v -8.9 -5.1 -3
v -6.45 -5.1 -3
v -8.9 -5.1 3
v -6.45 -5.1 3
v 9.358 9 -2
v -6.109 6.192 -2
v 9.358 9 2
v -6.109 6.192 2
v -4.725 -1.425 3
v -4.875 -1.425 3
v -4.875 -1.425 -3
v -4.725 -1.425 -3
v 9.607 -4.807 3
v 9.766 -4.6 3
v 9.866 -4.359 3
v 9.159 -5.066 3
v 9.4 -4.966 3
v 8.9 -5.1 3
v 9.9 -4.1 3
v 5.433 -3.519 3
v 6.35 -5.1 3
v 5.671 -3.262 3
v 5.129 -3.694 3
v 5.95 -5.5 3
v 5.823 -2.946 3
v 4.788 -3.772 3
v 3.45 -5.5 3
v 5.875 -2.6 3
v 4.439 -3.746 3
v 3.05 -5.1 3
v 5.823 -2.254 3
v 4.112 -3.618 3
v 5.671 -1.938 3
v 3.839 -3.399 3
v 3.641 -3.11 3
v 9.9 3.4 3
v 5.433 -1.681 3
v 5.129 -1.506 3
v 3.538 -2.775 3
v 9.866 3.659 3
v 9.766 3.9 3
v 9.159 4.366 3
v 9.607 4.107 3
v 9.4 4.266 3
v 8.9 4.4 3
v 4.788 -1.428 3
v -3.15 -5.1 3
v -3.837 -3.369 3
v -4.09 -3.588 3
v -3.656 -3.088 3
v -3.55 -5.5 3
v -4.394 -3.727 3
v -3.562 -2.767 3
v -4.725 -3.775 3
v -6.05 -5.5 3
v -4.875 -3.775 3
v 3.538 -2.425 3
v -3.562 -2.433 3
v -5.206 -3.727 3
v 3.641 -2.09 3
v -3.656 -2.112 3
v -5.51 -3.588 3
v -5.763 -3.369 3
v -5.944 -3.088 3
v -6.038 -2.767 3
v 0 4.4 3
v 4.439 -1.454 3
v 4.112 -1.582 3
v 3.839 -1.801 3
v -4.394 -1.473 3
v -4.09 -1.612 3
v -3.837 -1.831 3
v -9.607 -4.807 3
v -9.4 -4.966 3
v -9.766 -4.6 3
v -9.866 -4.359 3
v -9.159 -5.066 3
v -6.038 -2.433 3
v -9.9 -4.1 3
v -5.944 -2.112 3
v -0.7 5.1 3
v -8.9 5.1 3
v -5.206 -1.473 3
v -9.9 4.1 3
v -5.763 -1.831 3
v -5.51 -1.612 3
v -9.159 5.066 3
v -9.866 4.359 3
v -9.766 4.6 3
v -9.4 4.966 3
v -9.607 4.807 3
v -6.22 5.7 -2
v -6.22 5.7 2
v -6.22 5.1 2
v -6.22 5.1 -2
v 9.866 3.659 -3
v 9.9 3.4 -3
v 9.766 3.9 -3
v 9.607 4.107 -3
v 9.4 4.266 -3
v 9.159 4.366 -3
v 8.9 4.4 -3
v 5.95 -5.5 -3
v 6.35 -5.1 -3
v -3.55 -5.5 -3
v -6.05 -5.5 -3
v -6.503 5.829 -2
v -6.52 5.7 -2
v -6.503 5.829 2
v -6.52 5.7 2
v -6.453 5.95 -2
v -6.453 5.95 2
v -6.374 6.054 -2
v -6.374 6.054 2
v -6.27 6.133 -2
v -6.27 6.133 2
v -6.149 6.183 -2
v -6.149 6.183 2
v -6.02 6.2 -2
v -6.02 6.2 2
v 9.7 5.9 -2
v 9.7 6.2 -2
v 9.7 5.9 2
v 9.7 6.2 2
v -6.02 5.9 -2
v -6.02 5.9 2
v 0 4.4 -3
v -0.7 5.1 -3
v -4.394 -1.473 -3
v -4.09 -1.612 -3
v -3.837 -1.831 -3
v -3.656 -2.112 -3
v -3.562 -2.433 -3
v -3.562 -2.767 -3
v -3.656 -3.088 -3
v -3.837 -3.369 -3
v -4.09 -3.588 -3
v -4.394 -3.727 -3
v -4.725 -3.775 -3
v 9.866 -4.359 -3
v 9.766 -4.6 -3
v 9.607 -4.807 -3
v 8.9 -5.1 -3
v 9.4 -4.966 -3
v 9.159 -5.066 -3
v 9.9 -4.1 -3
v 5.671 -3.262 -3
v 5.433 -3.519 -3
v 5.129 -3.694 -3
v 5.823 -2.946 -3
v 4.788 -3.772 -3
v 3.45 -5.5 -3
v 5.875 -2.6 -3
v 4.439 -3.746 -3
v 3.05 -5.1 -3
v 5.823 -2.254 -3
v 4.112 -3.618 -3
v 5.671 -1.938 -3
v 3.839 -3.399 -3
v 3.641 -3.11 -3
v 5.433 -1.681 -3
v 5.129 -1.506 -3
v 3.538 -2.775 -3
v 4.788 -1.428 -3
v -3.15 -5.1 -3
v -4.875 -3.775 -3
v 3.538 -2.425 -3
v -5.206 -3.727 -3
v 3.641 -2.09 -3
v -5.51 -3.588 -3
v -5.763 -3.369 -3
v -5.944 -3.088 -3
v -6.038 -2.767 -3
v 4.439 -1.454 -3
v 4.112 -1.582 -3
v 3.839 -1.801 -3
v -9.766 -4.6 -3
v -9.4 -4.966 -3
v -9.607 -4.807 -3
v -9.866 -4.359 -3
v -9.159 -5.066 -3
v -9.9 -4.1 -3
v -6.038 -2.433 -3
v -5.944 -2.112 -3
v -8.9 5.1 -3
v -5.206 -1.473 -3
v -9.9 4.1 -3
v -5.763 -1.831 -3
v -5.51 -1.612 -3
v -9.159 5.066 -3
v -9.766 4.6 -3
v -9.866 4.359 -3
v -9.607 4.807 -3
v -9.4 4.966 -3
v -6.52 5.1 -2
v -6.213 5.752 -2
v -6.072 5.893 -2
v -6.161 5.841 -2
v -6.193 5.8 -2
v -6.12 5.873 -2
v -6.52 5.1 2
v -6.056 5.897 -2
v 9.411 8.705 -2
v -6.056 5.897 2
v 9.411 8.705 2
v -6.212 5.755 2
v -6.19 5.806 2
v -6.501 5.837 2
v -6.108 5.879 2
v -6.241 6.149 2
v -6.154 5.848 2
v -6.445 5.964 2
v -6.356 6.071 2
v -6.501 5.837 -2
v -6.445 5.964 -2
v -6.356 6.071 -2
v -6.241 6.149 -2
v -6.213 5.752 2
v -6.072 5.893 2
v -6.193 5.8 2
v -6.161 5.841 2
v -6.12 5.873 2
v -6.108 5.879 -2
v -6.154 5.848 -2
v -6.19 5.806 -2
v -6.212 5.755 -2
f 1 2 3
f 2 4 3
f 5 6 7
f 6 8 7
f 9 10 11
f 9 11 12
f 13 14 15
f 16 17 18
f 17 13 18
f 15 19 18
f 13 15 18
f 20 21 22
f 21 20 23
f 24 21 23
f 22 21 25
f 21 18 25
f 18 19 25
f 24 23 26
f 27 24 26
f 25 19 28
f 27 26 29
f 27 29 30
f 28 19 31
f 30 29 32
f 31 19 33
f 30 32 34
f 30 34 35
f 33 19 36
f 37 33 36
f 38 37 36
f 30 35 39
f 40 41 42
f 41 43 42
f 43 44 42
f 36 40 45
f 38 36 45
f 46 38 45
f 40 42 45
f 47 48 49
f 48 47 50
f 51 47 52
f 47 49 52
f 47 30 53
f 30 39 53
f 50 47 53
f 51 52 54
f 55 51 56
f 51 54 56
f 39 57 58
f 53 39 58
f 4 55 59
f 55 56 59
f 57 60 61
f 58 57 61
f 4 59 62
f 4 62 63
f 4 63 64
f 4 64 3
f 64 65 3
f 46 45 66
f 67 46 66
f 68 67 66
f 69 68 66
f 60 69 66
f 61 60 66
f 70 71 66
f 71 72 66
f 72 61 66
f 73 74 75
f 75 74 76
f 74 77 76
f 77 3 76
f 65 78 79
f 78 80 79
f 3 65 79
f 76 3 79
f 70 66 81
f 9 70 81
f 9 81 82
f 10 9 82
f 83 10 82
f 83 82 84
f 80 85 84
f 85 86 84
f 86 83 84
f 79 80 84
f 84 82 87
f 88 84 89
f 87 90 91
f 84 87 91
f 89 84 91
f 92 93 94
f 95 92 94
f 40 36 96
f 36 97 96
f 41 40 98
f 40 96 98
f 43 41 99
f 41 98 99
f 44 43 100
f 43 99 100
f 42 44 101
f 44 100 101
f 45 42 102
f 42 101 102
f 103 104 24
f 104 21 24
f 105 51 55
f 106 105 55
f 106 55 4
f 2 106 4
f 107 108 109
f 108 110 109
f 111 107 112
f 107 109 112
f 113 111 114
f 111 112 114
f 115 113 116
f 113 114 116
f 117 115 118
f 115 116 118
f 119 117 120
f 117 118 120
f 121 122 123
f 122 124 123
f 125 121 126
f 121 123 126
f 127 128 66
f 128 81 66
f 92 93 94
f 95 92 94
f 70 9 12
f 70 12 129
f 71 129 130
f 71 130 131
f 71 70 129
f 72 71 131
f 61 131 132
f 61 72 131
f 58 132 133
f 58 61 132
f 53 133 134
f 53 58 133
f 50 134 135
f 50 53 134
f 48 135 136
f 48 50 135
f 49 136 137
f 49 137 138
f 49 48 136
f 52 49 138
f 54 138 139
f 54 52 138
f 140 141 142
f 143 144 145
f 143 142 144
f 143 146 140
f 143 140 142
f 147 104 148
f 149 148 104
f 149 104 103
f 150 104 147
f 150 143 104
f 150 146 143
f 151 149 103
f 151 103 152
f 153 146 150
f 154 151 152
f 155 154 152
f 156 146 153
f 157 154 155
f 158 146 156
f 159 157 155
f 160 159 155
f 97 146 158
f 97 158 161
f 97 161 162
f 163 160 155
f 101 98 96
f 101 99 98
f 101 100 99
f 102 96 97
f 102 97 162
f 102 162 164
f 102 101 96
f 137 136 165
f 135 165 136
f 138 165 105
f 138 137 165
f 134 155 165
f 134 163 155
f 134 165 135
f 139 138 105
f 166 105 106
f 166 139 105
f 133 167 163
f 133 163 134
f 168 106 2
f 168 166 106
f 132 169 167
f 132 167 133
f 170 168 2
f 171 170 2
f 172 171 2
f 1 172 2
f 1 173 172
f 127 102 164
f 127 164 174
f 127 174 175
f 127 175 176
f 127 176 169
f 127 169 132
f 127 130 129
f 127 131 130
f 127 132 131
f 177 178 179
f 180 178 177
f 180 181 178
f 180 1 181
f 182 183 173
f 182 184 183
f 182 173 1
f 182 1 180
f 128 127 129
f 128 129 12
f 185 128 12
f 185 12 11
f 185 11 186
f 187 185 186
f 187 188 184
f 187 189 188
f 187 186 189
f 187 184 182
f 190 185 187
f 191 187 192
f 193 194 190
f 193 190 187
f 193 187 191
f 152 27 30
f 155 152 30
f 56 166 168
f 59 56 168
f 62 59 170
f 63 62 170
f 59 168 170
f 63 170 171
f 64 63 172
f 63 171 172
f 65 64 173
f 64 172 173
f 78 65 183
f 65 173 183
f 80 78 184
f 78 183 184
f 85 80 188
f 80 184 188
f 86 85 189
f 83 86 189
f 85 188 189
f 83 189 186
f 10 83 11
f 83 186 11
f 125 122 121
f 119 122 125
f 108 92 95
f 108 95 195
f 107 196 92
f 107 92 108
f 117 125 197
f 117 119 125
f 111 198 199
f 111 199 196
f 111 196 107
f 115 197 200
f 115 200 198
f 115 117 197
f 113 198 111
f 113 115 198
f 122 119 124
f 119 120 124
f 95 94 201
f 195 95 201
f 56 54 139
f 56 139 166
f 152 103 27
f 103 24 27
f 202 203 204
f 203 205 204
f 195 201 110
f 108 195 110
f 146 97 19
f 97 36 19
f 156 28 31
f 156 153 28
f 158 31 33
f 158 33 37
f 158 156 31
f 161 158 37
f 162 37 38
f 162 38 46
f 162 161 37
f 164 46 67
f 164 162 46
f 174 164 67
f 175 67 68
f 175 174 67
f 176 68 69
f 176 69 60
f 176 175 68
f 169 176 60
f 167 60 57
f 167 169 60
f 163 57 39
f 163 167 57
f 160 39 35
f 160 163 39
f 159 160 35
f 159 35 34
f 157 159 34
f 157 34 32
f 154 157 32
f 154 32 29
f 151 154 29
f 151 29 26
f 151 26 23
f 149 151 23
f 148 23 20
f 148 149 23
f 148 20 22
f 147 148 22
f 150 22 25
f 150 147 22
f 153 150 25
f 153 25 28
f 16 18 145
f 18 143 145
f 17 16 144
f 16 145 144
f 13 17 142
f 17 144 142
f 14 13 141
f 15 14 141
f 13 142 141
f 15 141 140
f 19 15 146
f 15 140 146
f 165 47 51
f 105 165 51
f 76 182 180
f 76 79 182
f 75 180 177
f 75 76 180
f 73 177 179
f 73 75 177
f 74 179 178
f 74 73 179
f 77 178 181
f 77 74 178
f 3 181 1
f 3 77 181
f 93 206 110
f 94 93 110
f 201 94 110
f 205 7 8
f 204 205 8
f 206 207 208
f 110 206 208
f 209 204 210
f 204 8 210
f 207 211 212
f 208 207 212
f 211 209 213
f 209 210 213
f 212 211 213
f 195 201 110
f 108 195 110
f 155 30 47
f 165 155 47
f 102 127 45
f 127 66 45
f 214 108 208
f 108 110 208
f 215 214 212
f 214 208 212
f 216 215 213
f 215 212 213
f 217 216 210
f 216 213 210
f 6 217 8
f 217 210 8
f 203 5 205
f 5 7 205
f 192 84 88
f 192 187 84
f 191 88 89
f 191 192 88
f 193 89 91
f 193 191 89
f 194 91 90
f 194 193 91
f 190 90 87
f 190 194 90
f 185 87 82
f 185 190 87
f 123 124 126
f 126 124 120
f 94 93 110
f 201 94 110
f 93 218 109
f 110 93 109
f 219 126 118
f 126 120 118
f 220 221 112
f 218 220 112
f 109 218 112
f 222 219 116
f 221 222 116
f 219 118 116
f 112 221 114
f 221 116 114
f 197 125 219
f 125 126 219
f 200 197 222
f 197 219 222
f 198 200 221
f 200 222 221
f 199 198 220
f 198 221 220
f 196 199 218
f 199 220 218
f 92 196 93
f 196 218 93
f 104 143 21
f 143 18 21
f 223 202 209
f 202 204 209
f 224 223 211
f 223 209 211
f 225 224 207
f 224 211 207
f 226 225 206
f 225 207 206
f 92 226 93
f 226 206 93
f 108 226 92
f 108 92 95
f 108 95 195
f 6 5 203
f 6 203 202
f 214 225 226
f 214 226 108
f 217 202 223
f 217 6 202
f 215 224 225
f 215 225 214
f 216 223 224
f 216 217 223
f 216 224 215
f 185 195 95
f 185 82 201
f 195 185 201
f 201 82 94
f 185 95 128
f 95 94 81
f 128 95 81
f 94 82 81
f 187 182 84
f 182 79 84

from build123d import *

# Parameters (mm, degrees)
SKETCH1_R           = 1.175
BOSS_EXTRUDE1_DEPTH = 3
FILLET1_R           = 1
BOSS_EXTRUDE3_DEPTH = 2
BOSS_EXTRUDE4_DEPTH = 2


with BuildPart() as part:
    # Sketch1 → Boss-Extrude1 (new body, symmetric)
    with BuildSketch(Plane.XY):
        Polygon((-9.9, -5.1), (-9.9, 5.1), (-0.7, 5.1), (0, 4.4), (9.9, 4.4), (9.9, -5.1), (6.35, -5.1), (5.95, -5.5), (3.45, -5.5), (3.05, -5.1), (-3.15, -5.1), (-3.55, -5.5), (-6.05, -5.5), (-6.45, -5.1), align=None)
        with Locations((4.7, -2.6)):
            Circle(SKETCH1_R, mode=Mode.SUBTRACT)
        with BuildLine():
            Line((-4.875, -1.425), (-4.725, -1.425))
            ThreePointArc((-4.725, -1.425), (-3.55, -2.6), (-4.725, -3.775))
            Line((-4.725, -3.775), (-4.875, -3.775))
            ThreePointArc((-4.875, -3.775), (-6.05, -2.6), (-4.875, -1.425))
        make_face(mode=Mode.SUBTRACT)
    extrude(amount=BOSS_EXTRUDE1_DEPTH, both=True)

    # Fillet1
    fillet1_edges = [part.edges().sort_by_distance(p)[0] for p in [
        (-9.9, -5.1, 0),
        (-9.9, 5.1, 0),
        (9.9, 4.4, 0),
        (9.9, -5.1, 0),
    ]]
    fillet(fillet1_edges, radius=FILLET1_R)

    # Sketch2 → Boss-Extrude3 (add, symmetric)
    with BuildSketch(Plane.XY):
        with BuildLine():
            Line((-6.52, 5.1), (-6.52, 5.7))
            ThreePointArc((-6.52, 5.7), (-6.373553391, 6.053553391), (-6.02, 6.2))
            Line((-6.02, 6.2), (9.7, 6.2))
            Line((9.7, 6.2), (9.7, 5.9))
            Line((9.7, 5.9), (-6.02, 5.9))
            ThreePointArc((-6.02, 5.9), (-6.161421356, 5.841421356), (-6.22, 5.7))
            Line((-6.22, 5.7), (-6.22, 5.1))
            Line((-6.22, 5.1), (-6.52, 5.1))
        make_face()
    extrude(amount=BOSS_EXTRUDE3_DEPTH, both=True)


with BuildPart() as body_2:
    # Sketch4 → Boss-Extrude4 (new body, symmetric)
    with BuildSketch(Plane.XY):
        with BuildLine():
            Line((-6.52, 5.1), (-6.52, 5.7))
            ThreePointArc((-6.52, 5.7), (-6.403834047, 6.020423819), (-6.109314304, 6.191958286))
            Line((-6.109314304, 6.191958286), (9.357854207, 9))
            Line((9.357854207, 9), (9.411442789, 8.704825028))
            Line((9.411442789, 8.704825028), (-6.055725722, 5.896783314))
            ThreePointArc((-6.055725722, 5.896783314), (-6.173533619, 5.828169528), (-6.22, 5.7))
            Line((-6.22, 5.7), (-6.22, 5.1))
            Line((-6.22, 5.1), (-6.52, 5.1))
        make_face()
    extrude(amount=BOSS_EXTRUDE4_DEPTH, both=True)


solid = Compound([part.part, body_2.part])
